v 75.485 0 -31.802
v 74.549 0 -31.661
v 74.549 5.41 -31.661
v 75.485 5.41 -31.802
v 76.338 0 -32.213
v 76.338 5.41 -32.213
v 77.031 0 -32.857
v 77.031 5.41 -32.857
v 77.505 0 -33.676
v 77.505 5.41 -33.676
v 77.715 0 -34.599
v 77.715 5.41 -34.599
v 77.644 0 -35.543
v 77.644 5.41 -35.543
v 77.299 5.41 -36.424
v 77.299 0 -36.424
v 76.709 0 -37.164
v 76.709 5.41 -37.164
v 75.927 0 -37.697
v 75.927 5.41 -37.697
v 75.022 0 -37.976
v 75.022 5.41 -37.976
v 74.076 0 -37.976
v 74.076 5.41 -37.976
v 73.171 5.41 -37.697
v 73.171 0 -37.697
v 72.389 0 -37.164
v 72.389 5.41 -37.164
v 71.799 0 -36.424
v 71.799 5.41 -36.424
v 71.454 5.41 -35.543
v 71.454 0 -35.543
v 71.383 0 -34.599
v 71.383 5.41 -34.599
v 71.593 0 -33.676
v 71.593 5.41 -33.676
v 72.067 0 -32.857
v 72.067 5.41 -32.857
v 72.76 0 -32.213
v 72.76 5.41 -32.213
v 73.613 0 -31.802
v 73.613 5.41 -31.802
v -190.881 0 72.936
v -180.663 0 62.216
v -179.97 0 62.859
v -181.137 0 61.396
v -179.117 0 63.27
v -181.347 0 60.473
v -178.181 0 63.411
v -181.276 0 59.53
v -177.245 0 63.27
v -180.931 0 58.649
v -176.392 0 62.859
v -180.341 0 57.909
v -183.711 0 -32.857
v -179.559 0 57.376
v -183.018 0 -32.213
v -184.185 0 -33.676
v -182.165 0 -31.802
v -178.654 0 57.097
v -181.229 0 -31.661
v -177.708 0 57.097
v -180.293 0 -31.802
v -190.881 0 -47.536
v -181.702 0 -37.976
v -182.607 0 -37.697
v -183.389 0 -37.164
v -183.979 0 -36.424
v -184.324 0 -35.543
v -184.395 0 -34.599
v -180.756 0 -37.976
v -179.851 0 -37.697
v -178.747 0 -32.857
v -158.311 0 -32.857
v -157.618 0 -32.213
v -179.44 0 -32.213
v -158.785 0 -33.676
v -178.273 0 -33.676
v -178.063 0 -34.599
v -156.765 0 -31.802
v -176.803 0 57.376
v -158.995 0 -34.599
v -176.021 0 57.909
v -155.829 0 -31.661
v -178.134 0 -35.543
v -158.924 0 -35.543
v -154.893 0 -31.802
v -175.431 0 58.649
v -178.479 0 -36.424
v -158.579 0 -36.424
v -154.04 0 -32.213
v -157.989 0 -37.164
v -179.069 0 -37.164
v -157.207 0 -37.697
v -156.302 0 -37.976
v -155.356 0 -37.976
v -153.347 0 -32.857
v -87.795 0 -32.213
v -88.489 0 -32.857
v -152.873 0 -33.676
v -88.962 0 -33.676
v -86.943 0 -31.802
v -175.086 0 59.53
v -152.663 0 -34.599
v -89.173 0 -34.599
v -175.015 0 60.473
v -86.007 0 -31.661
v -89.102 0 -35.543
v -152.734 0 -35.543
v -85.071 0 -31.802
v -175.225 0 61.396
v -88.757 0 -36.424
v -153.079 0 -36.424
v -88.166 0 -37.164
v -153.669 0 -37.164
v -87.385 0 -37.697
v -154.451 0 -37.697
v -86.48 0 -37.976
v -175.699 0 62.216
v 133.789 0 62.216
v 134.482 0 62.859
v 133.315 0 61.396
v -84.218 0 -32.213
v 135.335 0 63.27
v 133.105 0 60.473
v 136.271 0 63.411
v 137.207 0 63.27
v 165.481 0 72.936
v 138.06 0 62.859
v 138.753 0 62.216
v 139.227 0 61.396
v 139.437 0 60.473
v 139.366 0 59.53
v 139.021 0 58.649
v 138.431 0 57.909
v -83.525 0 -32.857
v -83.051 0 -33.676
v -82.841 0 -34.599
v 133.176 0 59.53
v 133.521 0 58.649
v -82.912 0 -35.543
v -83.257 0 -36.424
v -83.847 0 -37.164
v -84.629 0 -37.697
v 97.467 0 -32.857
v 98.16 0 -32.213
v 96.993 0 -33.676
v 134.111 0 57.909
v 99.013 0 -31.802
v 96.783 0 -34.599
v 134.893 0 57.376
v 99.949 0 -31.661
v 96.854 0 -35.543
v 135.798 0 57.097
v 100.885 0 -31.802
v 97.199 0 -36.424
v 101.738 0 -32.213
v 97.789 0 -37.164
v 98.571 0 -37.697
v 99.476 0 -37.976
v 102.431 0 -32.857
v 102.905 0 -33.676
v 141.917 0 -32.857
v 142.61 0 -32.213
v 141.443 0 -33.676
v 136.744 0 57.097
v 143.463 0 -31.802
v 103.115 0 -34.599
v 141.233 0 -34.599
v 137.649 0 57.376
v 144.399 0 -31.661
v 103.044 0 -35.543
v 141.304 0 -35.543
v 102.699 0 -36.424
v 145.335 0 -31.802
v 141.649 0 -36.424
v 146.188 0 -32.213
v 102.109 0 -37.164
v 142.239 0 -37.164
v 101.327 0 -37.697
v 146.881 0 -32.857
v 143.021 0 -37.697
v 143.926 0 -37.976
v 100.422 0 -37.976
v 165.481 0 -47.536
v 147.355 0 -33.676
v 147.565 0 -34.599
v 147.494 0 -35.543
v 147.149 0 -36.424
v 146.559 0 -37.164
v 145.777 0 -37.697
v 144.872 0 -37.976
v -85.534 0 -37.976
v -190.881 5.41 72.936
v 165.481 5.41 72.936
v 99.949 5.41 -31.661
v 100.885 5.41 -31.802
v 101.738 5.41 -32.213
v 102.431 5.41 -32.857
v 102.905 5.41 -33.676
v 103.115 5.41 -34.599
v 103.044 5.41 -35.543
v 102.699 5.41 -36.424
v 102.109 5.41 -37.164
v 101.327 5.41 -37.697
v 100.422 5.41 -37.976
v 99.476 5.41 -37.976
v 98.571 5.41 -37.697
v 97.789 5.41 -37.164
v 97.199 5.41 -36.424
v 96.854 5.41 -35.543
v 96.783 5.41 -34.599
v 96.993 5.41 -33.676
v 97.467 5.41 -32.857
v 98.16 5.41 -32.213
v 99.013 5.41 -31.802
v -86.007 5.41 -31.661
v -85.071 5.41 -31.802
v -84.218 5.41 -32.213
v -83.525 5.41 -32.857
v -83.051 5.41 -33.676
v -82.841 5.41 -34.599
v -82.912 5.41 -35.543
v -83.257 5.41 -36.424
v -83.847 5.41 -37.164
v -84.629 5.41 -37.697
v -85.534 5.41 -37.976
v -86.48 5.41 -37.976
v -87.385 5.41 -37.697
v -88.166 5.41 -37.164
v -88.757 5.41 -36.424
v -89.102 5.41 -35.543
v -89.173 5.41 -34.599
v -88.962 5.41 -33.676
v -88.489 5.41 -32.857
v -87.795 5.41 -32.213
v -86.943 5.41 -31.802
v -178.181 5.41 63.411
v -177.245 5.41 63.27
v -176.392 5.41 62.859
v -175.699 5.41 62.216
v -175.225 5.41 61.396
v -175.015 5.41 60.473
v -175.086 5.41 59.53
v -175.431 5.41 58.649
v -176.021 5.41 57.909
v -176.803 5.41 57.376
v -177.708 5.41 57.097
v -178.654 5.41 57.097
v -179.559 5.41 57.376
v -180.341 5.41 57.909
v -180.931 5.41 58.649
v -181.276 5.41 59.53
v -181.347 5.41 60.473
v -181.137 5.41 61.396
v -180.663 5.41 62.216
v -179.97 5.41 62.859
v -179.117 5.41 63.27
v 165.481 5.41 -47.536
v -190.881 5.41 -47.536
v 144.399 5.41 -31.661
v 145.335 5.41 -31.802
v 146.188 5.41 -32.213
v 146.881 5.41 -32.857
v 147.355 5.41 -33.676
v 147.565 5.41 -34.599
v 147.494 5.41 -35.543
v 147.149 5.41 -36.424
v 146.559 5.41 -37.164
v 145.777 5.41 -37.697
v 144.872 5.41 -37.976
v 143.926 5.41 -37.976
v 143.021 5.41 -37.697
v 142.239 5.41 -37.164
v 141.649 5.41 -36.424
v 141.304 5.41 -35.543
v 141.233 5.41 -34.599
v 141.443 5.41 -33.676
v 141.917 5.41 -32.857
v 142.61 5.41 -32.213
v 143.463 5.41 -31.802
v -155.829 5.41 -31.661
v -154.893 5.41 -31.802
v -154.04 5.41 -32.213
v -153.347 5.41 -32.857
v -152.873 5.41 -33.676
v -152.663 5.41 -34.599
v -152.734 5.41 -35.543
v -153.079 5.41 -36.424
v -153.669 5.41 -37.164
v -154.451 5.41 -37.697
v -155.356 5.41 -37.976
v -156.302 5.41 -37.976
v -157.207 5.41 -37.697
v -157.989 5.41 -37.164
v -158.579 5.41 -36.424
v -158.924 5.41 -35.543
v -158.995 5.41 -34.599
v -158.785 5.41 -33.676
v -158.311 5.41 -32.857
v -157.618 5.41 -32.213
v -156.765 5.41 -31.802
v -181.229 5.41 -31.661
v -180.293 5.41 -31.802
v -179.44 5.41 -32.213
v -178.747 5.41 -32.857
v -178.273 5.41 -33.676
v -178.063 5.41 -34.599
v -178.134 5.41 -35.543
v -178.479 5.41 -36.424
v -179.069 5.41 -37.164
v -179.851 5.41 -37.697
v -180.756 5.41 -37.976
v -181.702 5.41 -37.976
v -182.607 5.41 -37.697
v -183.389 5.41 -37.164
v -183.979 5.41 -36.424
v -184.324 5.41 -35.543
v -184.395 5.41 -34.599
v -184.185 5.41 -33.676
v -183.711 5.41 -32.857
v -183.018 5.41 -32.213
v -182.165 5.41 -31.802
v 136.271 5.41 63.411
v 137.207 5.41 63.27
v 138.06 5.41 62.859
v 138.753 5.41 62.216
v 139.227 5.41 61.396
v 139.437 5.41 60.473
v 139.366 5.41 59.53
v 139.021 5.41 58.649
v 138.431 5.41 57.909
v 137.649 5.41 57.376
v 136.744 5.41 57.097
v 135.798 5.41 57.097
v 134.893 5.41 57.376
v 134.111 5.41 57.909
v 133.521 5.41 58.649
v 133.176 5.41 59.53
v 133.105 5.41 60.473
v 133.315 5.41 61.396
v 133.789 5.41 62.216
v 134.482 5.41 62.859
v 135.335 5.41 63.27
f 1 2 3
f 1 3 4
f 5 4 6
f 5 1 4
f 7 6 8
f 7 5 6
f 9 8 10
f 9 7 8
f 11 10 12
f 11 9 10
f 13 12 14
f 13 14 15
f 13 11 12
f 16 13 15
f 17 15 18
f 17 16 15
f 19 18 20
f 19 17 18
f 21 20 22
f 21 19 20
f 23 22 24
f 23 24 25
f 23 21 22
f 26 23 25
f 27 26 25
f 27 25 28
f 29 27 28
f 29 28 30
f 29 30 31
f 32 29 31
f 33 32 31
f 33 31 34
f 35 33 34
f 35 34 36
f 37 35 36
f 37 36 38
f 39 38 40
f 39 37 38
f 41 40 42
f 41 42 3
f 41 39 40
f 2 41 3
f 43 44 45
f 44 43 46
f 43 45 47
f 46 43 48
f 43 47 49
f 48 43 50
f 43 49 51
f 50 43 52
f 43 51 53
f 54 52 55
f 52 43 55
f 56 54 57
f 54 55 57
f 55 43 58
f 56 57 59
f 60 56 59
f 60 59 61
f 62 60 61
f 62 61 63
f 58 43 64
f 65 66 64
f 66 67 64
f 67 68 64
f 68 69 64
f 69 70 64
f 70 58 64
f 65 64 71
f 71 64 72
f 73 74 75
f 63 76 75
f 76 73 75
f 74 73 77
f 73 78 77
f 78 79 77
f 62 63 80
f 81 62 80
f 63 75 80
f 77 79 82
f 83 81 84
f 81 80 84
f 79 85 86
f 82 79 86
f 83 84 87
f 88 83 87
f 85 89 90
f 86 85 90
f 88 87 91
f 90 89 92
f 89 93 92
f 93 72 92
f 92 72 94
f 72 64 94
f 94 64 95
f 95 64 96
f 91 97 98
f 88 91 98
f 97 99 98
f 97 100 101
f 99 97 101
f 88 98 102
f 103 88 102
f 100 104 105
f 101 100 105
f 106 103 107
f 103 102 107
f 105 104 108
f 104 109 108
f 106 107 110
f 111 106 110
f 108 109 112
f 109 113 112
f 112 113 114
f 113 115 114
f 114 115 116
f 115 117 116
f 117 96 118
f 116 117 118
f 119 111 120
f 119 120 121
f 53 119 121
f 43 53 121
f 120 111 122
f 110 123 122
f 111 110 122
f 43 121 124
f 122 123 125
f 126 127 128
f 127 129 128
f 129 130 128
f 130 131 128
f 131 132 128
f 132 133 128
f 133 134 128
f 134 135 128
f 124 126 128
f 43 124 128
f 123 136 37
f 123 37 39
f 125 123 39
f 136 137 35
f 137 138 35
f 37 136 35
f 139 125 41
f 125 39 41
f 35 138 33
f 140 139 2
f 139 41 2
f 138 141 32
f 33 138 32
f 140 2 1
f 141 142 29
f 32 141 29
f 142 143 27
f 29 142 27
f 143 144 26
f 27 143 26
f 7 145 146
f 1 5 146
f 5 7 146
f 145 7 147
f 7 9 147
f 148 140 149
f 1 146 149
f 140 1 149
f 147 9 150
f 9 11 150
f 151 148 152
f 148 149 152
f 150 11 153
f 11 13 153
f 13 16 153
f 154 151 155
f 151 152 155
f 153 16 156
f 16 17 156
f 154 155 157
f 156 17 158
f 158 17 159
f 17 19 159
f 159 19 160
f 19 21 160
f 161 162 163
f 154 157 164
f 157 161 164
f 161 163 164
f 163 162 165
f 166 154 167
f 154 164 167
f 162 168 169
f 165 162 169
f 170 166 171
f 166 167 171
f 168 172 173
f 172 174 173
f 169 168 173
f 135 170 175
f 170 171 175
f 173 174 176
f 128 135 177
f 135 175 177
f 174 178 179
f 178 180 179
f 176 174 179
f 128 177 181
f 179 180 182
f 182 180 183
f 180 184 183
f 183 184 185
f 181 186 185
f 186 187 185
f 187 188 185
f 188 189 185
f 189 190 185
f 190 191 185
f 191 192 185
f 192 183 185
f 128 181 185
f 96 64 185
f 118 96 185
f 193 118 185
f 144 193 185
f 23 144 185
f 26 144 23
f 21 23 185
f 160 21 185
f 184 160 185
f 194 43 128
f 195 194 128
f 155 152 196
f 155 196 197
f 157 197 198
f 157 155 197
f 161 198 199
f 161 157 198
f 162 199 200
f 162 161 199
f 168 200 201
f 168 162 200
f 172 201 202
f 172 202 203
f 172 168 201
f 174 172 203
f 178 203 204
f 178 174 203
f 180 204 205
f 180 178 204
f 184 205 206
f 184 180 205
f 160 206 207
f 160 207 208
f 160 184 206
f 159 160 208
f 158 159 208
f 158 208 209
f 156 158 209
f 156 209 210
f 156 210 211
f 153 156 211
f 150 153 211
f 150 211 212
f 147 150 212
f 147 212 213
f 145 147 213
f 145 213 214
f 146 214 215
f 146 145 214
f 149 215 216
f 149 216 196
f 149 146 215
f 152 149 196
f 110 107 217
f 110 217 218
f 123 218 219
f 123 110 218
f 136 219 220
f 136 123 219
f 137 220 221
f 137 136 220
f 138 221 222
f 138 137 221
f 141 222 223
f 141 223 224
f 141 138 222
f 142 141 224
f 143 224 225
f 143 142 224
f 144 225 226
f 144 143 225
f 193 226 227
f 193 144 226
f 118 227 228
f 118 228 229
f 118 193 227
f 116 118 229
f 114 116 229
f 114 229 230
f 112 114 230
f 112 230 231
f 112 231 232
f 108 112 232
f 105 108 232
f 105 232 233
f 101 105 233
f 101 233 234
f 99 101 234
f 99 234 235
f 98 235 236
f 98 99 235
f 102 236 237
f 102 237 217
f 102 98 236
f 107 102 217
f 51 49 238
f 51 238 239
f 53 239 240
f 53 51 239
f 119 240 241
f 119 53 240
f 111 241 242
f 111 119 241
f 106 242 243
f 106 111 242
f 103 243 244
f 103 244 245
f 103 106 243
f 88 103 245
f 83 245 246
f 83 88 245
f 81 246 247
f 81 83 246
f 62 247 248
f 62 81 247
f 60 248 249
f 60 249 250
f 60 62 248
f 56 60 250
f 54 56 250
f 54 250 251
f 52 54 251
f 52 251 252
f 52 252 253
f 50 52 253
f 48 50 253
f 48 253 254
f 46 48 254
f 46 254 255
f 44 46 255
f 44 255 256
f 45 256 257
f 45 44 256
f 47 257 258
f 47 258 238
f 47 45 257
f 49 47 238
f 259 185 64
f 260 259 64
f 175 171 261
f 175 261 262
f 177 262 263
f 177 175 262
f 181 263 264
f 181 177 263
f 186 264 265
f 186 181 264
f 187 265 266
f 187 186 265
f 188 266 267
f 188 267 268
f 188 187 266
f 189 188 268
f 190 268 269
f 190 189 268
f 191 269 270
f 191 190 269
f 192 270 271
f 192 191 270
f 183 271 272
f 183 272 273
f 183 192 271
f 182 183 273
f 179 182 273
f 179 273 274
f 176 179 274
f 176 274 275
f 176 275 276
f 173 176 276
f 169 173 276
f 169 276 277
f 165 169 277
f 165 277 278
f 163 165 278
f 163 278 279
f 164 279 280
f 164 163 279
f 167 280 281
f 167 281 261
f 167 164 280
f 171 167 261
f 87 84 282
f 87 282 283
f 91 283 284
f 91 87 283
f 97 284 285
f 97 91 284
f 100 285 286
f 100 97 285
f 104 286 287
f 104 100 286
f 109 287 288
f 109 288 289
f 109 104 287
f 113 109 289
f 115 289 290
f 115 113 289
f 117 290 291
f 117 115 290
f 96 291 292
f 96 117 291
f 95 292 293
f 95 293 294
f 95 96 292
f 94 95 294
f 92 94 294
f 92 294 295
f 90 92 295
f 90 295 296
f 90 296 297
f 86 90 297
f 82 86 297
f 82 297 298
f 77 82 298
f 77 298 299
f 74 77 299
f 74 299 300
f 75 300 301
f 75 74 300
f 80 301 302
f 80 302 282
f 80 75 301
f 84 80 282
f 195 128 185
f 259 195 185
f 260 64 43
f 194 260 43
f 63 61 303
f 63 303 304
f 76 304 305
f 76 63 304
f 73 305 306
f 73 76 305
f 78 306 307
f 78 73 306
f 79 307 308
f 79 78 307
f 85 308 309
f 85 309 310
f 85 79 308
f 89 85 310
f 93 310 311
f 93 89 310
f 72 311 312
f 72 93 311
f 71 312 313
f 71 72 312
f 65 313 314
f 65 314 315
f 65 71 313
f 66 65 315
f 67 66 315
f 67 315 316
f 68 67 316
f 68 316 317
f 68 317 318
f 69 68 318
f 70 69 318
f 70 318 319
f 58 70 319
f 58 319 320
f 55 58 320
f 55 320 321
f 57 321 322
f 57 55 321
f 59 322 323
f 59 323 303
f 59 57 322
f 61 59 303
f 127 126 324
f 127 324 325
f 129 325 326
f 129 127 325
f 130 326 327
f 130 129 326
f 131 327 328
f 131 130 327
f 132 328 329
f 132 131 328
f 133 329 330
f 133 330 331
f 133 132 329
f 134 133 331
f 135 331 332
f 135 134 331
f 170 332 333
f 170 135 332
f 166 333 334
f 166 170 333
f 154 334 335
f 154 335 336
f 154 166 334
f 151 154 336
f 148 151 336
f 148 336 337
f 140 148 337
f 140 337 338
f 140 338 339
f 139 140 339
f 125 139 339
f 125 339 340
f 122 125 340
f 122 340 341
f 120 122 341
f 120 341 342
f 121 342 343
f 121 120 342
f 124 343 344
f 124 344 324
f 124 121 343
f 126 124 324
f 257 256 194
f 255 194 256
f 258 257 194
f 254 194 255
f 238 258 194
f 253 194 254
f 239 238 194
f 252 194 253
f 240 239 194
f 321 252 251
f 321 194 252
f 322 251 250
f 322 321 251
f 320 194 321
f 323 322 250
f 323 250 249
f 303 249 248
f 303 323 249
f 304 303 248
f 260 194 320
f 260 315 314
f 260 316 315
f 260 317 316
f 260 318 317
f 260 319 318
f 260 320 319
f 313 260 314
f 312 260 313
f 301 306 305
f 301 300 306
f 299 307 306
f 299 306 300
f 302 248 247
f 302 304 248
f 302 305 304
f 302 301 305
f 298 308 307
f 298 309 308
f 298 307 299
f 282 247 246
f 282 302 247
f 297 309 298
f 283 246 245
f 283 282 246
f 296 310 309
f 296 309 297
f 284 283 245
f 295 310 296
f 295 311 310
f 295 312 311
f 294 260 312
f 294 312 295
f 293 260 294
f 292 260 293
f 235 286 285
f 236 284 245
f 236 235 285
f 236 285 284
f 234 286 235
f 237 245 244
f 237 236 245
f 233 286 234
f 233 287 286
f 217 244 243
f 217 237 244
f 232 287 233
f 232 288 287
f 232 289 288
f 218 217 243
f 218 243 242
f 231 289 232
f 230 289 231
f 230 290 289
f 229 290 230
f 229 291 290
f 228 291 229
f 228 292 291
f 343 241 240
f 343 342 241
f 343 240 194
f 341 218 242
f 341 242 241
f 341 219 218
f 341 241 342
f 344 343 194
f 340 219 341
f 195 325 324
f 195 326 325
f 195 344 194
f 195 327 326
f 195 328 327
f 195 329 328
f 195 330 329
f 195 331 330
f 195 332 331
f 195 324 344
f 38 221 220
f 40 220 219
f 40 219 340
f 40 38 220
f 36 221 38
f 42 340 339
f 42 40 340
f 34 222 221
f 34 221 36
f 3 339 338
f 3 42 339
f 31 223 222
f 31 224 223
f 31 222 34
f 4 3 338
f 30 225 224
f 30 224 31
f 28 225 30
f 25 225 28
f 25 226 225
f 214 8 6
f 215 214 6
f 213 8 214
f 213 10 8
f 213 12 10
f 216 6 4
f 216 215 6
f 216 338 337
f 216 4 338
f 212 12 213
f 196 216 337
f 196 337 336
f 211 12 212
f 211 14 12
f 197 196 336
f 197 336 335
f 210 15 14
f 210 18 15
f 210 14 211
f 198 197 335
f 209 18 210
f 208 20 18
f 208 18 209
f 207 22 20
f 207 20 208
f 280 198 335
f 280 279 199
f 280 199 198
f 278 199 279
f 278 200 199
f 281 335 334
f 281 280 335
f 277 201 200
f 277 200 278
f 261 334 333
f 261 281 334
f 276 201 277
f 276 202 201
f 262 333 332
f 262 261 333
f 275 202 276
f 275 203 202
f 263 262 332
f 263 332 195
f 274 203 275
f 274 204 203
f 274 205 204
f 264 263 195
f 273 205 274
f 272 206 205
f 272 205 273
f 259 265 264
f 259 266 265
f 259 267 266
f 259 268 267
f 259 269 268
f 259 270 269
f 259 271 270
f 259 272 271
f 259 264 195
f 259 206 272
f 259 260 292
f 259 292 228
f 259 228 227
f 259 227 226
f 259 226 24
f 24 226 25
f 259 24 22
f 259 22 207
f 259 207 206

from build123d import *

# Parameters (mm, degrees)
SKETCH1_R           = 3.175
SKETCH1_W           = 25.4
SKETCH1_H           = 95.0722
SKETCH1_W_2         = 5.4102
SKETCH1_H_2         = 12.7
BOSS_EXTRUDE1_DEPTH = 5.4102


with BuildPart() as part:
    # Sketch1 → Boss-Extrude1 (new body)
    # profile 1 of 4: a face of its own
    with BuildSketch(Plane(origin=(0, 0, 0), x_dir=(1, 0, 0), z_dir=(0, 1, 0))):
        Polygon((-165.481, 47.5361), (-165.481, -47.5361), (86.5759, -47.5361), (91.9861, -47.5361), (114.8334, -47.5361), (165.481, -47.5361), (165.481, -42.1259), (165.481, 47.5361), (62.5475, 47.5361), (-73.30694, 47.5361), align=None)
        with Locations(Location((-155.829, 34.8361, 0), (0, 0, 270))):
            Circle(SKETCH1_R, mode=Mode.SUBTRACT)
        with Locations(Location((-86.00694, 34.8361, 0), (0, 0, 270))):
            Circle(SKETCH1_R, mode=Mode.SUBTRACT)
        with Locations(Location((74.549, 34.8361, 0), (0, 0, 270))):
            Circle(SKETCH1_R, mode=Mode.SUBTRACT)
        with Locations(Location((99.949, 34.8361, 0), (0, 0, 270))):
            Circle(SKETCH1_R, mode=Mode.SUBTRACT)
        with Locations(Location((144.399, 34.8361, 0), (0, 0, 270))):
            Circle(SKETCH1_R, mode=Mode.SUBTRACT)
    # profile 2 of 4: a face of its own
    with BuildSketch(Plane(origin=(0, 0, 0), x_dir=(1, 0, 0), z_dir=(0, 1, 0))):
        with Locations((-178.181, 0)):
            Rectangle(SKETCH1_W, SKETCH1_H)
        with Locations(Location((-181.229, 34.8361, 0), (0, 0, 270))):
            Circle(SKETCH1_R, mode=Mode.SUBTRACT)
    # profile 3 of 4: a face of its own
    with BuildSketch(Plane(origin=(0, 0, 0), x_dir=(1, 0, 0), z_dir=(0, 1, 0))):
        Polygon((86.5759, -47.5361), (-165.481, -47.5361), (-190.881, -47.5361), (-190.881, -72.9361), (165.481, -72.9361), (165.481, -47.5361), (114.8334, -47.5361), (91.9861, -47.5361), (91.9861, -60.2361), (86.5759, -60.2361), align=None)
        with Locations(Location((-178.181, -60.2361, 0), (0, 0, 270))):
            Circle(SKETCH1_R, mode=Mode.SUBTRACT)
        with Locations(Location((136.271, -60.2361, 0), (0, 0, 270))):
            Circle(SKETCH1_R, mode=Mode.SUBTRACT)
    # profile 4 of 4: a face of its own
    with BuildSketch(Plane(origin=(0, 0, 0), x_dir=(1, 0, 0), z_dir=(0, 1, 0))):
        with Locations((89.281, -53.8861)):
            Rectangle(SKETCH1_W_2, SKETCH1_H_2)
    extrude(amount=BOSS_EXTRUDE1_DEPTH)


solid = part.part
